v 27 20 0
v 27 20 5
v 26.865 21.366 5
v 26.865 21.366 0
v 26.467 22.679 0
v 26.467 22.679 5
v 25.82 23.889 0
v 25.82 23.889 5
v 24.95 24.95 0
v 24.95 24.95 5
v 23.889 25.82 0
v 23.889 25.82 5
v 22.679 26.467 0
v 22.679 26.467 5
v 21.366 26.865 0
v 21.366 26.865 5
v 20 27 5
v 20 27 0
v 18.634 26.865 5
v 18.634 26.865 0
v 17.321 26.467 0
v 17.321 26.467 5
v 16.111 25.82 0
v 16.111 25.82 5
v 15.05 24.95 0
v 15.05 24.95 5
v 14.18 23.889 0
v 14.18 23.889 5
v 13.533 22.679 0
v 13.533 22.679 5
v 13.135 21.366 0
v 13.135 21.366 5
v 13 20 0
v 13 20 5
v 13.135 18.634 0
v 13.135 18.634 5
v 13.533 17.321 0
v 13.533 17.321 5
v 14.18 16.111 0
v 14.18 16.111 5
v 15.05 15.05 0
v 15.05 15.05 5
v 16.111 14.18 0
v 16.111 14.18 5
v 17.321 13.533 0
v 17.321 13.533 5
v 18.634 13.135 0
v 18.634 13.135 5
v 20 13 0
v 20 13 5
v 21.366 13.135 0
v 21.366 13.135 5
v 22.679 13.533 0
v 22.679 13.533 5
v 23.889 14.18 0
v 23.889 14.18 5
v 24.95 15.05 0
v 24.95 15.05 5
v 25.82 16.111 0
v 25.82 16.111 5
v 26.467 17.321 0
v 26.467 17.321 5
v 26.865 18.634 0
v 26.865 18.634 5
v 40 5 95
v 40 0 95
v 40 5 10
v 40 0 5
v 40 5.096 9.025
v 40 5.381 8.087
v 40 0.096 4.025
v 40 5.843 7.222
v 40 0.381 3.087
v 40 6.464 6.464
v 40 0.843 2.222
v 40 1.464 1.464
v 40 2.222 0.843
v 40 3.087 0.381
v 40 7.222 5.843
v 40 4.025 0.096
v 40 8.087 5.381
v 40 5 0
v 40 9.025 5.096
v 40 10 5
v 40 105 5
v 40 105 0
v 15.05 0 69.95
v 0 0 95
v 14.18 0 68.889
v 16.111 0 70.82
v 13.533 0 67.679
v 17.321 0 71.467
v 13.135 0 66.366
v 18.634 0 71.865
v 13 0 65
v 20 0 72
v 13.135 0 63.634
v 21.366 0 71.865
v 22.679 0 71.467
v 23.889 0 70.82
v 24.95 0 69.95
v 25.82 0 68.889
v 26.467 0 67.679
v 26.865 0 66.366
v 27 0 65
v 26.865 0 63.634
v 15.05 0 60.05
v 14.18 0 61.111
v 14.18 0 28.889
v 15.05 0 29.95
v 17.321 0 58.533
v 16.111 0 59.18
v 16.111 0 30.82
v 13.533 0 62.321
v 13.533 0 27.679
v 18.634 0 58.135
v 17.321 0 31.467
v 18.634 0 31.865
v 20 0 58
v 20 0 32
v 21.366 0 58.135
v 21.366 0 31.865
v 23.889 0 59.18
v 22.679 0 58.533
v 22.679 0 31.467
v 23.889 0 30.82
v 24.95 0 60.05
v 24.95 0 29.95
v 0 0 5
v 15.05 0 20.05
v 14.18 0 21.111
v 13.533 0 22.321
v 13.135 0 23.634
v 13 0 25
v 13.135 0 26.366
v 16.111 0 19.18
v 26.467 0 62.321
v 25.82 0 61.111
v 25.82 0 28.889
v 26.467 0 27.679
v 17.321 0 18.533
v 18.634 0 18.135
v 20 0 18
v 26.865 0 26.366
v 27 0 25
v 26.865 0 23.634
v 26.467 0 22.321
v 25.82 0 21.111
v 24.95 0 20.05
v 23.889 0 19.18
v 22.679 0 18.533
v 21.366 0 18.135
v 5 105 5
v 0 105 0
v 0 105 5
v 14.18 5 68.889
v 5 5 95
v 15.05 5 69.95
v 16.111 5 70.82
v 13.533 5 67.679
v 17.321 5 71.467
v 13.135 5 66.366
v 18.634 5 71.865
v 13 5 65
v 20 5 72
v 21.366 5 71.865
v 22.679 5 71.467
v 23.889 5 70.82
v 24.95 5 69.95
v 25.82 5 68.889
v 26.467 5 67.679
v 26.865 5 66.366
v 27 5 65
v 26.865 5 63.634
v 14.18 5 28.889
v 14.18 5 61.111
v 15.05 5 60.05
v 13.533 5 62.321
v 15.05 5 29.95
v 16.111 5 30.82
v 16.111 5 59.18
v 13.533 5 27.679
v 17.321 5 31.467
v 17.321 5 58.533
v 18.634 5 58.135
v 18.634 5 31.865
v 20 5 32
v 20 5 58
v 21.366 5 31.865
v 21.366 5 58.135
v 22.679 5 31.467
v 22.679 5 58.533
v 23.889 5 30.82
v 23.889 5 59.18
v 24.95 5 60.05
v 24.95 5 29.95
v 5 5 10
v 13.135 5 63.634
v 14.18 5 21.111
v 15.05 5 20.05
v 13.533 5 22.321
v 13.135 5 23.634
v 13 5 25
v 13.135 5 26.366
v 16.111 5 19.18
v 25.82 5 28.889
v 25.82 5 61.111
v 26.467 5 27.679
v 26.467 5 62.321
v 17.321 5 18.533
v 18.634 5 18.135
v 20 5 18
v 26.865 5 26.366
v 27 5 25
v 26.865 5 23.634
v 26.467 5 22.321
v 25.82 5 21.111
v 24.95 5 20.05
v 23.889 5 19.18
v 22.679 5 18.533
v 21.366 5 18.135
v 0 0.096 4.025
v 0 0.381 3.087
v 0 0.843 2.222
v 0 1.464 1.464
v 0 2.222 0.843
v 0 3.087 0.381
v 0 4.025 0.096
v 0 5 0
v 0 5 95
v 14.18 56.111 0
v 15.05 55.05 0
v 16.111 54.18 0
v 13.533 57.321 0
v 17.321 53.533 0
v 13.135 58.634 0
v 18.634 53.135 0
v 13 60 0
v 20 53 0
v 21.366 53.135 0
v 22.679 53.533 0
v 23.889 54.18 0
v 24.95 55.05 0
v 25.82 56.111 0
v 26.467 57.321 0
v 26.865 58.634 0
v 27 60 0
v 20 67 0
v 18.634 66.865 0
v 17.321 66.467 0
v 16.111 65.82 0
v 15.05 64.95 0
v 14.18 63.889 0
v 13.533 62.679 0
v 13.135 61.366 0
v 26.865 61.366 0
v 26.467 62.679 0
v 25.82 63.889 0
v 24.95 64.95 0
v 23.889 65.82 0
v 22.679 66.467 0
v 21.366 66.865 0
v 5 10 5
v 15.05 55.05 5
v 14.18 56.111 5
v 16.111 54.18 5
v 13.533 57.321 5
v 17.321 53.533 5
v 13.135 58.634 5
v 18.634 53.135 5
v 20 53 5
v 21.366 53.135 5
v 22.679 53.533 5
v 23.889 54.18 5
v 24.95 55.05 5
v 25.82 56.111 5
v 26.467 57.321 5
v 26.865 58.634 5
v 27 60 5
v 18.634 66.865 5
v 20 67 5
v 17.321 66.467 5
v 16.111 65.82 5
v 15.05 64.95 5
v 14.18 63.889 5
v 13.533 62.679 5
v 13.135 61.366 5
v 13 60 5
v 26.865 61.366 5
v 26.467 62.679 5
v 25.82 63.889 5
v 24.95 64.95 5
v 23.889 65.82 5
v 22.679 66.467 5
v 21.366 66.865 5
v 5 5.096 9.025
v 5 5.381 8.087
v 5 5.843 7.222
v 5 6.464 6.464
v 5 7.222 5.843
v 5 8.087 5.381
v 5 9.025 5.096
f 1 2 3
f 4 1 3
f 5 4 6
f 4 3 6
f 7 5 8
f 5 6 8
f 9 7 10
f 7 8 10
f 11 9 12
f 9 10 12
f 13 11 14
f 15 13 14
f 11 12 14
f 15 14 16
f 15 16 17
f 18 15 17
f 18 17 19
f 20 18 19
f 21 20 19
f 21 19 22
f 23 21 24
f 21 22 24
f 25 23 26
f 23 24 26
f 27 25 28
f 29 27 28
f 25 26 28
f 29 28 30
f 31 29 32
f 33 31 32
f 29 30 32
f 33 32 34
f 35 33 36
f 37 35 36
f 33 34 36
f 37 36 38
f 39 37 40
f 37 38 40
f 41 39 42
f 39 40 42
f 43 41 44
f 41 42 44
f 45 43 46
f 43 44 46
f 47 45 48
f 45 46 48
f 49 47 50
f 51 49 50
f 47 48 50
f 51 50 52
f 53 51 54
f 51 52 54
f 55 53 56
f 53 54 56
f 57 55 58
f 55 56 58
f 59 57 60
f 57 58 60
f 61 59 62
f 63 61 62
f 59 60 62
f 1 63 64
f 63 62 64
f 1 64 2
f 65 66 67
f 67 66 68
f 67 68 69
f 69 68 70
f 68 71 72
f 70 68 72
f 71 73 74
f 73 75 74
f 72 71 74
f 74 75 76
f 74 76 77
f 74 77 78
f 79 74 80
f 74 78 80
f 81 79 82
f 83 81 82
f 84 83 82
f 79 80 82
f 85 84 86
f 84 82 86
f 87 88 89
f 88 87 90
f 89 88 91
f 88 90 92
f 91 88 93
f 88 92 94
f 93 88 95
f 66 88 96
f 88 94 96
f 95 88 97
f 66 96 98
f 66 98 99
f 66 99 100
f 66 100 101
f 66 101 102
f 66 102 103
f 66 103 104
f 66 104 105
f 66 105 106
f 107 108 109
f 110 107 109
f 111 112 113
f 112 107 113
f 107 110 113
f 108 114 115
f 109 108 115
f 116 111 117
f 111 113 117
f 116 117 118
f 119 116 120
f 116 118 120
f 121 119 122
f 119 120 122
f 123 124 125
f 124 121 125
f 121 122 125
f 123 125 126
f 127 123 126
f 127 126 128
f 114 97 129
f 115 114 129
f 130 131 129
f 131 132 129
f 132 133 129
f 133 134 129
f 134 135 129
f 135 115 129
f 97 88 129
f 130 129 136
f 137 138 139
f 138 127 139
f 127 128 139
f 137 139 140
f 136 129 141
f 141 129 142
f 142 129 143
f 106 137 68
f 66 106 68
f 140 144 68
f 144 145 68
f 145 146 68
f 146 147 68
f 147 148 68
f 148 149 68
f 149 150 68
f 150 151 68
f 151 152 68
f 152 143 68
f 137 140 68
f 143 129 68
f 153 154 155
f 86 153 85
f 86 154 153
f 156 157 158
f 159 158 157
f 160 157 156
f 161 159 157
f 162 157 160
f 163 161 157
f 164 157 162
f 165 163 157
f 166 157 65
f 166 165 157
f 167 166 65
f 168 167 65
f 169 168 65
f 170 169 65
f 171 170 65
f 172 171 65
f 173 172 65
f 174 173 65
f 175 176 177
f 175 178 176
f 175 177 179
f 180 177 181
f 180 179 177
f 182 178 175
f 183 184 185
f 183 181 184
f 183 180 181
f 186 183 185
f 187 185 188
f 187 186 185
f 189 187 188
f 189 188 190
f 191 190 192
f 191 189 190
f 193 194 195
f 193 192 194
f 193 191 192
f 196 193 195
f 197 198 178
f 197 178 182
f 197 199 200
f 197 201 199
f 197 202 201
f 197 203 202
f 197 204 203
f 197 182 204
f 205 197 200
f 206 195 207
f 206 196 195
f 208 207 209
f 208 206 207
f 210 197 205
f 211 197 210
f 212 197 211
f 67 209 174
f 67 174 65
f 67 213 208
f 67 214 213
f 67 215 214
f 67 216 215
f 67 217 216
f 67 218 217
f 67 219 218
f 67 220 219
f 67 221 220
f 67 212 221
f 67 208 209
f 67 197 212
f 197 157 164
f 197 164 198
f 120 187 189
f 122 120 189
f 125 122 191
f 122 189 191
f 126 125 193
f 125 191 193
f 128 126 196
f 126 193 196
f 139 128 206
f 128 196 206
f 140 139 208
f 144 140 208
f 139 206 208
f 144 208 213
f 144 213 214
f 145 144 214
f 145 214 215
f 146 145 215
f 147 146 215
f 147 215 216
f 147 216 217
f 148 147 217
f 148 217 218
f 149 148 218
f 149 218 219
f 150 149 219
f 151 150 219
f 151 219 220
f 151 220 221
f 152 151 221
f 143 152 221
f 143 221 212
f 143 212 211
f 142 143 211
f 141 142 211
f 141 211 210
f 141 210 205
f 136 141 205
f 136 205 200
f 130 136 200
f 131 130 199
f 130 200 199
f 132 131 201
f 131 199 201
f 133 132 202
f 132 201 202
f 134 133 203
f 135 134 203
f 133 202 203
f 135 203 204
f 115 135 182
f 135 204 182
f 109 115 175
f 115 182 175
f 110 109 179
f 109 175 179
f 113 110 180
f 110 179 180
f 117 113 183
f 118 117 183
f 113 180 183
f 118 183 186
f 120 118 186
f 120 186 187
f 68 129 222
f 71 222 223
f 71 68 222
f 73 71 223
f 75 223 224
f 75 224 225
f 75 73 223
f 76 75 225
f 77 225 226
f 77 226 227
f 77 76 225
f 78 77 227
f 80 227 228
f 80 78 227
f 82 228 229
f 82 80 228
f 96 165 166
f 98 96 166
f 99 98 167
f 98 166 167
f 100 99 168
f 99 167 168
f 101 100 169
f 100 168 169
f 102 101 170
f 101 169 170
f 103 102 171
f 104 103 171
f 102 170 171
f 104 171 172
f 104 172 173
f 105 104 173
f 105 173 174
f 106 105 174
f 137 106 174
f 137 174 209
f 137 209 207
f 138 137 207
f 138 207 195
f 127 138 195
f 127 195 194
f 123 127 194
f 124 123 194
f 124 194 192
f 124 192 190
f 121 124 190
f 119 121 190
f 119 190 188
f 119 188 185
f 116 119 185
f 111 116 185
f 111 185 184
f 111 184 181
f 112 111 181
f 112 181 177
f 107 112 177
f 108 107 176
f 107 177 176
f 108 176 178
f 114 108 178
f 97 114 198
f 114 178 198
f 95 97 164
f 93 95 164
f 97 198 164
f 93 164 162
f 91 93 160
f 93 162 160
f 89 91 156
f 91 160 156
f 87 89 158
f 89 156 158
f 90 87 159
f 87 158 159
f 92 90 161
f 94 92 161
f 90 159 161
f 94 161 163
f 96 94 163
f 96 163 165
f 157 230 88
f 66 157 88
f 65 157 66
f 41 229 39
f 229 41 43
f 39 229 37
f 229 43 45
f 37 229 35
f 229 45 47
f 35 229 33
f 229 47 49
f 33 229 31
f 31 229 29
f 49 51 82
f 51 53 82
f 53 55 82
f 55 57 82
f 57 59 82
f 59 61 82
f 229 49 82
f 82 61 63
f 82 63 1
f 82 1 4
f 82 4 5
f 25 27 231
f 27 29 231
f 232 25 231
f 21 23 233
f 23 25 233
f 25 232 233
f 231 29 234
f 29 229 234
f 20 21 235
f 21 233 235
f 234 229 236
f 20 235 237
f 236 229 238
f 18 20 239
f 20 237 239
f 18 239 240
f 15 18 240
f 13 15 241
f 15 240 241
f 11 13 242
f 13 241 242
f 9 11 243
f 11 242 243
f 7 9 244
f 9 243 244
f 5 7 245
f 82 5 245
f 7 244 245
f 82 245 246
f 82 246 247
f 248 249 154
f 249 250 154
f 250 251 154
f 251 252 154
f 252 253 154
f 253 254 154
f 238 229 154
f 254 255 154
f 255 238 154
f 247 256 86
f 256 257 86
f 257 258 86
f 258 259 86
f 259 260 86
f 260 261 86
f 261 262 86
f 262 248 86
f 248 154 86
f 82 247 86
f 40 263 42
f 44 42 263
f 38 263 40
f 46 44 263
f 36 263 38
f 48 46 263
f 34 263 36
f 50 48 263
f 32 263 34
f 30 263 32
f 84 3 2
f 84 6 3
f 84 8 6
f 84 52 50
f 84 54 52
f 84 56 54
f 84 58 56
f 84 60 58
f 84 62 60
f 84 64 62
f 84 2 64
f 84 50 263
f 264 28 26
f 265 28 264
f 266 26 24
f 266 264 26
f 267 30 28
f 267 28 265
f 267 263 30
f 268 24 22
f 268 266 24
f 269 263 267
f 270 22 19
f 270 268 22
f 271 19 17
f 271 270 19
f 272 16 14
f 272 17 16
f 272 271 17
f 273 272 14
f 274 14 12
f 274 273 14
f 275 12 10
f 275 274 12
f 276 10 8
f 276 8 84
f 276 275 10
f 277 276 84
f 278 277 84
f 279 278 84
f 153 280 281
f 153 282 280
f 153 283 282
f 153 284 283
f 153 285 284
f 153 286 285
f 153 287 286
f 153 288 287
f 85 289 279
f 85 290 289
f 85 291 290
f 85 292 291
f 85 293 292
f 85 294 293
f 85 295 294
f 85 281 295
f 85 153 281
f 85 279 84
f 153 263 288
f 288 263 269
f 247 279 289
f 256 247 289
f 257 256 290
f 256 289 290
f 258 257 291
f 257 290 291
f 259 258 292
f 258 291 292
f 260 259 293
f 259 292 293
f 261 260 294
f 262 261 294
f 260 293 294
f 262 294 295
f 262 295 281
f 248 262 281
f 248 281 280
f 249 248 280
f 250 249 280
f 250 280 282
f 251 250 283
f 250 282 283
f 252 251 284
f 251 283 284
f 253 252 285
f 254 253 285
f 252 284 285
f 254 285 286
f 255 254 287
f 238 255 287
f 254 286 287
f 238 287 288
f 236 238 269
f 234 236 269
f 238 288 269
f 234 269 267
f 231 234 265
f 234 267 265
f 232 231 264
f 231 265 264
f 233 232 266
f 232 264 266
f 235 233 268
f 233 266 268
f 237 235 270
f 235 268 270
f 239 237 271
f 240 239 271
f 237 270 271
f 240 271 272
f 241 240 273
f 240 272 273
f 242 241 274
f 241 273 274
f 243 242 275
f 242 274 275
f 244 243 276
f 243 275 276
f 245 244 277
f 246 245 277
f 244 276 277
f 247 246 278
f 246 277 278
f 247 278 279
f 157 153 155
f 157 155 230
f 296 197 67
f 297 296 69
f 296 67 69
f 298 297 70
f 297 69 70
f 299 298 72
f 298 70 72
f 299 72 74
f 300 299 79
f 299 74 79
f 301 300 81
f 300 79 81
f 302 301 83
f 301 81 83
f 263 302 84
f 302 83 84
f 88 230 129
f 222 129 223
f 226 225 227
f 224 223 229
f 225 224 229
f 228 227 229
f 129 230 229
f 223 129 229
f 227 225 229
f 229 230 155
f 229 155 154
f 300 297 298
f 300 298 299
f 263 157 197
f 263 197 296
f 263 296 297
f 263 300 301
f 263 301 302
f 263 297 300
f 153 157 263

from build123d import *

# Parameters (mm, degrees)
CROQUIS1_W              = 40
CROQUIS1_H              = 105
SALIENTE_EXTRUIR1_DEPTH = 5
CROQUIS2_R              = 7
CORTAR_EXTRUIR1_DEPTH   = 5
CROQUIS2_3_R            = 7
CORTAR_EXTRUIR2_DEPTH   = 5
CROQUIS4_W              = 40
CROQUIS4_H              = 5
SALIENTE_EXTRUIR2_DEPTH = 90
CROQUIS5_R              = 7
CORTAR_EXTRUIR3_DEPTH   = 90
CROQUIS5_3_R            = 7
CORTAR_EXTRUIR4_DEPTH   = 90
REDONDEO3_R             = 5
REDONDEO4_R             = 5
SALIENTE_EXTRUIR3_START = -5
SALIENTE_EXTRUIR3_DEPTH = 5


with BuildPart() as part:
    # Croquis1 → Saliente-Extruir1 (new body)
    with BuildSketch(Plane.XY):
        with Locations((20, 52.5)):
            Rectangle(CROQUIS1_W, CROQUIS1_H)
    extrude(amount=SALIENTE_EXTRUIR1_DEPTH)

    # Croquis2 → Cortar-Extruir1 (cut)
    with BuildSketch(Plane.XY.offset(5)):
        with Locations((20, 60)):
            Circle(CROQUIS2_R)
    extrude(amount=-CORTAR_EXTRUIR1_DEPTH, mode=Mode.SUBTRACT)

    # Croquis2<3> → Cortar-Extruir2 (cut)
    with BuildSketch(Plane.XY.offset(5)):
        with Locations((20, 20)):
            Circle(CROQUIS2_3_R)
    extrude(amount=-CORTAR_EXTRUIR2_DEPTH, mode=Mode.SUBTRACT)

    # Croquis4 → Saliente-Extruir2 (add)
    with BuildSketch(Plane.XY.offset(5)):
        with Locations((20, 2.5)):
            Rectangle(CROQUIS4_W, CROQUIS4_H)
    extrude(amount=SALIENTE_EXTRUIR2_DEPTH)

    # Croquis5 → Cortar-Extruir3 (cut)
    with BuildSketch(Plane(origin=(0, 5, 0), x_dir=(1, 0, 0), z_dir=(0, 1, 0))):
        with Locations((20, -25)):
            Circle(CROQUIS5_R)
    extrude(amount=-CORTAR_EXTRUIR3_DEPTH, mode=Mode.SUBTRACT)

    # Croquis5<3> → Cortar-Extruir4 (cut)
    with BuildSketch(Plane(origin=(0, 5, 0), x_dir=(1, 0, 0), z_dir=(0, 1, 0))):
        with Locations((20, -25)):
            Circle(CROQUIS5_3_R)
        with Locations((20, -65)):
            Circle(CROQUIS5_3_R)
    extrude(amount=-CORTAR_EXTRUIR4_DEPTH, mode=Mode.SUBTRACT)

    # Redondeo3
    redondeo3_edges = [part.edges().sort_by_distance(p)[0] for p in [
        (20, 5, 5),
    ]]
    fillet(redondeo3_edges, radius=REDONDEO3_R)

    # Redondeo4
    redondeo4_edges = [part.edges().sort_by_distance(p)[0] for p in [
        (20, 0, 0),
    ]]
    fillet(redondeo4_edges, radius=REDONDEO4_R)

    # Croquis6 → Saliente-Extruir3 (add)
    with BuildSketch(Plane.ZY.offset(SALIENTE_EXTRUIR3_START)):
        with BuildLine():
            Line((5, 105), (95, 5))
            Line((95, 5), (10, 5))
            ThreePointArc((10, 5), (6.464466094, 6.464466094), (5, 10))
            Line((5, 10), (5, 105))
        make_face()
    extrude(amount=SALIENTE_EXTRUIR3_DEPTH)


solid = part.part
